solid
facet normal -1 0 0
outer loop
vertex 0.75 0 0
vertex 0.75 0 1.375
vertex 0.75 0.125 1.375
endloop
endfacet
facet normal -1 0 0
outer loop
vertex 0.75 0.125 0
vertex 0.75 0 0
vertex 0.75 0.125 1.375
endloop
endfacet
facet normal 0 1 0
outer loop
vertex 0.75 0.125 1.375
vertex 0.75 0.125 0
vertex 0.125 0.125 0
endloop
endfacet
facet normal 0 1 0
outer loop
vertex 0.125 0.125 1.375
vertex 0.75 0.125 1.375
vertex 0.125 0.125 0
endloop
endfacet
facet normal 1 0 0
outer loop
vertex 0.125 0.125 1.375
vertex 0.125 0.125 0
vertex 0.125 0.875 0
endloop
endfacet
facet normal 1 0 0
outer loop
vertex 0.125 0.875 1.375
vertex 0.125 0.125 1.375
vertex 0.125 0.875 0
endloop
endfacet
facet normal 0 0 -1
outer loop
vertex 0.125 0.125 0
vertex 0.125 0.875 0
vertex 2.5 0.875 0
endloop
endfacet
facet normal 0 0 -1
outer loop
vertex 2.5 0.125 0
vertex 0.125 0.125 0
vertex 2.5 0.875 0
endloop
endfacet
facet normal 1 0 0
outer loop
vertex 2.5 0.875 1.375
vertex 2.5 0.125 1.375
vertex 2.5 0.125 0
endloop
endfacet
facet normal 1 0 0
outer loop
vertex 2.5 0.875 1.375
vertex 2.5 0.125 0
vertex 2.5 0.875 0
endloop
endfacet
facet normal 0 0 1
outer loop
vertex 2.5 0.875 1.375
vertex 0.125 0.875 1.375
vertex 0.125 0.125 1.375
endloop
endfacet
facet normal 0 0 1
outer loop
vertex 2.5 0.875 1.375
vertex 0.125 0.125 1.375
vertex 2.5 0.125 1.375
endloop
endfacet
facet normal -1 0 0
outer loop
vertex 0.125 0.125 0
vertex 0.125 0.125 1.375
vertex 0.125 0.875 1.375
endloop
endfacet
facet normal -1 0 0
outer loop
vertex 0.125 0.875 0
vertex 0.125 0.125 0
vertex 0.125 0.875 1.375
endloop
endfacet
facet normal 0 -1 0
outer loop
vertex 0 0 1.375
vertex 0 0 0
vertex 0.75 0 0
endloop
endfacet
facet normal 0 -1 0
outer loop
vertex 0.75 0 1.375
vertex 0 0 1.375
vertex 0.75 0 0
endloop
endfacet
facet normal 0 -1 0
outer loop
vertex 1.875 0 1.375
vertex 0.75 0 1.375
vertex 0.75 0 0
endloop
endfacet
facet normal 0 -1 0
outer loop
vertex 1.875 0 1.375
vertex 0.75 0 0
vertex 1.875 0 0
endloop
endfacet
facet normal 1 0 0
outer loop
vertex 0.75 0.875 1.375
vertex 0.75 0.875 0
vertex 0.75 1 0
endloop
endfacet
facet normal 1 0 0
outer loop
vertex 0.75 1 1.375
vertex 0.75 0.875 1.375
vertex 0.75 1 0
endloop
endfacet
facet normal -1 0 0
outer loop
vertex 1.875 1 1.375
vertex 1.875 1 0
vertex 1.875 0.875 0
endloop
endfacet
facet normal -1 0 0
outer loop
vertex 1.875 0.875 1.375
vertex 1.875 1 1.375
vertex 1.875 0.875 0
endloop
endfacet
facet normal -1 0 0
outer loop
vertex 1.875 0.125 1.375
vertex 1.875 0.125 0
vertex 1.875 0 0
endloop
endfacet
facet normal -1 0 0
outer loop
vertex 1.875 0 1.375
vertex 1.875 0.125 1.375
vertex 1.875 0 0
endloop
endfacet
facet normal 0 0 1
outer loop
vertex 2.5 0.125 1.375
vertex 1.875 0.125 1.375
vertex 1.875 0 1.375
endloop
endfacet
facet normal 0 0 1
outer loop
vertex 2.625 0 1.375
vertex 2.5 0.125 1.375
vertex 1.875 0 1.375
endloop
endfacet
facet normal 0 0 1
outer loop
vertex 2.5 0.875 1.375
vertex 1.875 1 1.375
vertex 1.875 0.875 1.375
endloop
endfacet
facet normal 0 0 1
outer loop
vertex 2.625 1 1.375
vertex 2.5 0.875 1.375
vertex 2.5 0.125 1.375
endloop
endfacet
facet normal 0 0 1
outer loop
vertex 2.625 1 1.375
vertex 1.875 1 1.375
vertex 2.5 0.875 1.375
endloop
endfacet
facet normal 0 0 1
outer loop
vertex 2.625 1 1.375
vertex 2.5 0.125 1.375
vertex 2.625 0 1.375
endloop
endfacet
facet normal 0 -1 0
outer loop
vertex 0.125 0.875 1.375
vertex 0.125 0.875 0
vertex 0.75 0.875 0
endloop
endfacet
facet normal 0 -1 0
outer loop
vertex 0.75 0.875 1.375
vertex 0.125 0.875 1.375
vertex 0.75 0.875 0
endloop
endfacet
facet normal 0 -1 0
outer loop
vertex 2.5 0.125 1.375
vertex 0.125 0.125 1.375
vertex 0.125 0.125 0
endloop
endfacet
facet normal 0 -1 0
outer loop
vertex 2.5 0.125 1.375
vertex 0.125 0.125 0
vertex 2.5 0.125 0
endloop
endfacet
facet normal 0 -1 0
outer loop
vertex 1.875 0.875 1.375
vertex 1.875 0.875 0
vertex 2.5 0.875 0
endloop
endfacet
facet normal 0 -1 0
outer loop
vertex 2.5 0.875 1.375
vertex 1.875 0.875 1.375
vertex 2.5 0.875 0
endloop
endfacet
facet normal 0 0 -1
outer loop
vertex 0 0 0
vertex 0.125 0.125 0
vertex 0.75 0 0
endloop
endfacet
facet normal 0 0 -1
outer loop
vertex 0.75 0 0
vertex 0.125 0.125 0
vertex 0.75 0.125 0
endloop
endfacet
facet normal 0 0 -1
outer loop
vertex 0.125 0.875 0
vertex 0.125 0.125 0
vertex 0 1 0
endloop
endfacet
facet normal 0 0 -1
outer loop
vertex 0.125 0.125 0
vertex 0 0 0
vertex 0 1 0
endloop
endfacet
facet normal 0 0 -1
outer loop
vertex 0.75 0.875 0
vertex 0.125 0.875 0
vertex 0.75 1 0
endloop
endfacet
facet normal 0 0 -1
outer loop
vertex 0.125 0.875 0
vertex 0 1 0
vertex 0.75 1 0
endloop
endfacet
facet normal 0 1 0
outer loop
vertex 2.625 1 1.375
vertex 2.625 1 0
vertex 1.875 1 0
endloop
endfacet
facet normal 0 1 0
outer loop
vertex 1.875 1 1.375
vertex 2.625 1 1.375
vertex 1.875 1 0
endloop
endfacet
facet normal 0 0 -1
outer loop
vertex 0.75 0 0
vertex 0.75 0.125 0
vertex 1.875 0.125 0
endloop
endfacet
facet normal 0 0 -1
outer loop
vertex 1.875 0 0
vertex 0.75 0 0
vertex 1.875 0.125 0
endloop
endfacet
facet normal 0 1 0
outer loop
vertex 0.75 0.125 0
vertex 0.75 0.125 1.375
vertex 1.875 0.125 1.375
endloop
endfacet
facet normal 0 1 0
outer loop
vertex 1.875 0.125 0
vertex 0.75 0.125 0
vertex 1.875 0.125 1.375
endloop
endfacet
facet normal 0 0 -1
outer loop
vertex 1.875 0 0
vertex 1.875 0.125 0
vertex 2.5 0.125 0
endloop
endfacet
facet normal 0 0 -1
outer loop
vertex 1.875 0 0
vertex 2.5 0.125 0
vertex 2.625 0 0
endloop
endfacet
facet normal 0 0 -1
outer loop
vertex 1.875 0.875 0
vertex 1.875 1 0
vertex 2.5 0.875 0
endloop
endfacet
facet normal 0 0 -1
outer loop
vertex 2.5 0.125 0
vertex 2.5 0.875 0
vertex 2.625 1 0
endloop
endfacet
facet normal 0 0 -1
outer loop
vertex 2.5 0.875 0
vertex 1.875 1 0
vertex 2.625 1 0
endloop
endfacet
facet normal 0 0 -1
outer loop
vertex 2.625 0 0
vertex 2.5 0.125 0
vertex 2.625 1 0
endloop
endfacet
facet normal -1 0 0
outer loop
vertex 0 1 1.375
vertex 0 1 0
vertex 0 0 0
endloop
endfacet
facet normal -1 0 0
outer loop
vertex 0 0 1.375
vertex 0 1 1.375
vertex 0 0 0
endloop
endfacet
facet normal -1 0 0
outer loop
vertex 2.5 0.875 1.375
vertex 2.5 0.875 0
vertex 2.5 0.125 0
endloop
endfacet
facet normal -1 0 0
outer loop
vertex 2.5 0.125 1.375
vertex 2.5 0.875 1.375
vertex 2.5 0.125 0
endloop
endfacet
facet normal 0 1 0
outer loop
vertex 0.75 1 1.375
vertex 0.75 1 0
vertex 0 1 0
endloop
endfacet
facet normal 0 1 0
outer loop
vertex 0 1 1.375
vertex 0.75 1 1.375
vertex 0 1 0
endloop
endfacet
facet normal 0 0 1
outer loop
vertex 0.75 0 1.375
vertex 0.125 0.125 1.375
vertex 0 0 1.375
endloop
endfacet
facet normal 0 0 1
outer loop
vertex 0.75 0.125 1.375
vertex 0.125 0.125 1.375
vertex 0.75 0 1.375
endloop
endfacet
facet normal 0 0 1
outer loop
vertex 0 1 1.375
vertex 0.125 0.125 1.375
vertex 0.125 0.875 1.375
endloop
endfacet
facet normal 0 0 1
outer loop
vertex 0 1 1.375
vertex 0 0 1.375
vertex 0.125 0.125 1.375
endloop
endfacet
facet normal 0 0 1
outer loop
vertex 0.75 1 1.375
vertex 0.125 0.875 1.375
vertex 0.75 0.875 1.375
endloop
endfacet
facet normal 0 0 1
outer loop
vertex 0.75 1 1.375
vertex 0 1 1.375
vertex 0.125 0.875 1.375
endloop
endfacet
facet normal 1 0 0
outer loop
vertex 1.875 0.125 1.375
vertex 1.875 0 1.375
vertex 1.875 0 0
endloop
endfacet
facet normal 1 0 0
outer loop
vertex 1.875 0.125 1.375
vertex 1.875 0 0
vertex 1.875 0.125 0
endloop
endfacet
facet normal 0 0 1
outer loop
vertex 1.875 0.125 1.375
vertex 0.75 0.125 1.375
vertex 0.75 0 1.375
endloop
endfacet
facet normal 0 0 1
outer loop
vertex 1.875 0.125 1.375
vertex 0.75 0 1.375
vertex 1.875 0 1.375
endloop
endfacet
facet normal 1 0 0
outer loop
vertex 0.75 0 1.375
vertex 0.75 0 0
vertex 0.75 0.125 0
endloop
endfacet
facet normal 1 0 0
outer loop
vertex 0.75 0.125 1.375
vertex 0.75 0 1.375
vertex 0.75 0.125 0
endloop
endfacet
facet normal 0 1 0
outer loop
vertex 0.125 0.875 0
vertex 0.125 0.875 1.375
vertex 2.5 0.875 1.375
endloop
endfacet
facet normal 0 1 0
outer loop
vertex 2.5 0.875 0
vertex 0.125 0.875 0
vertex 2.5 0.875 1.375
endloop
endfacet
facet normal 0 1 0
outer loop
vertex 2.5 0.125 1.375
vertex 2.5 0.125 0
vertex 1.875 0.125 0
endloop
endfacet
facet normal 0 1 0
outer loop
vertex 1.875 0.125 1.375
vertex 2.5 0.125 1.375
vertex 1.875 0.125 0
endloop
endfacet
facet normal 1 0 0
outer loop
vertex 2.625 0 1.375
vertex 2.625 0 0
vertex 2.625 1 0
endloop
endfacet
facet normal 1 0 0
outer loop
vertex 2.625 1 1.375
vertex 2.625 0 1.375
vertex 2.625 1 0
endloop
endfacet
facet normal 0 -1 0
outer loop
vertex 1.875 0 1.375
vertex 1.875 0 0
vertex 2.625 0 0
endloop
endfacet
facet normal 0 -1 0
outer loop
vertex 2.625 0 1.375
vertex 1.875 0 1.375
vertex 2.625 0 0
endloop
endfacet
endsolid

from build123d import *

# Parameters (mm, degrees)
DODANIE_WYCI_GNI_CIE1_DEPTH   = 0.55
DODANIE_WYCI_GNI_CIE1_2_DEPTH = 0.55
SZKIC2_W                      = 0.45
SZKIC2_H                      = 0.05
DODANIE_WYCI_GNI_CIE2_DEPTH   = 0.55
SZKIC3_W                      = 0.95
SZKIC3_H                      = 0.3
DODANIE_WYCI_GNI_CIE3_DEPTH   = 0.55
SKALA1_SCALE                  = 2.5


with BuildPart() as part:
    # Szkic1 → Dodanie-wyciągnięcie1 (new body)
    with BuildSketch(Plane.XY):
        Polygon((0.3, 0.05), (0.05, 0.05), (0.05, 0.35), (0.3, 0.35), (0.3, 0.4), (0, 0.4), (0, 0), (0.3, 0), align=None)
    extrude(amount=DODANIE_WYCI_GNI_CIE1_DEPTH)


with BuildPart() as body_2:
    # Szkic1 → Dodanie-wyci_gni_cie1 2 (new body)
    with BuildSketch(Plane.XY):
        Polygon((0.75, 0.35), (1, 0.35), (1, 0.05), (0.75, 0.05), (0.75, 0), (1.05, 0), (1.05, 0.4), (0.75, 0.4), align=None)
    extrude(amount=DODANIE_WYCI_GNI_CIE1_2_DEPTH)


with BuildPart() as body_3:
    # Szkic2 → Dodanie-wyciągnięcie2 (new body)
    with BuildSketch(Plane.XY.offset(0.55)):
        with Locations((0.525, 0.025)):
            Rectangle(SZKIC2_W, SZKIC2_H)
    extrude(amount=-DODANIE_WYCI_GNI_CIE2_DEPTH)


with BuildPart() as body_4:
    # Szkic3 → Dodanie-wyciągnięcie3 (new body)
    with BuildSketch(Plane.XY.offset(0.55)):
        with Locations((0.525, 0.2)):
            Rectangle(SZKIC3_W, SZKIC3_H)
    extrude(amount=-DODANIE_WYCI_GNI_CIE3_DEPTH)


with BuildPart() as body_2_1:
    # Skala1: scaled about (0, 0, 0)
    add(body_2.part.scale(SKALA1_SCALE))


with BuildPart() as body_4_1:
    # Skala1: scaled about (0, 0, 0)
    add(body_4.part.scale(SKALA1_SCALE))


with BuildPart() as body_3_1:
    # Skala1: scaled about (0, 0, 0)
    add(body_3.part.scale(SKALA1_SCALE))


with BuildPart() as part_1:
    # Skala1: scaled about (0, 0, 0)
    add(part.part.scale(SKALA1_SCALE))


solid = Compound([body_2_1.part, body_4_1.part, body_3_1.part, part_1.part])
